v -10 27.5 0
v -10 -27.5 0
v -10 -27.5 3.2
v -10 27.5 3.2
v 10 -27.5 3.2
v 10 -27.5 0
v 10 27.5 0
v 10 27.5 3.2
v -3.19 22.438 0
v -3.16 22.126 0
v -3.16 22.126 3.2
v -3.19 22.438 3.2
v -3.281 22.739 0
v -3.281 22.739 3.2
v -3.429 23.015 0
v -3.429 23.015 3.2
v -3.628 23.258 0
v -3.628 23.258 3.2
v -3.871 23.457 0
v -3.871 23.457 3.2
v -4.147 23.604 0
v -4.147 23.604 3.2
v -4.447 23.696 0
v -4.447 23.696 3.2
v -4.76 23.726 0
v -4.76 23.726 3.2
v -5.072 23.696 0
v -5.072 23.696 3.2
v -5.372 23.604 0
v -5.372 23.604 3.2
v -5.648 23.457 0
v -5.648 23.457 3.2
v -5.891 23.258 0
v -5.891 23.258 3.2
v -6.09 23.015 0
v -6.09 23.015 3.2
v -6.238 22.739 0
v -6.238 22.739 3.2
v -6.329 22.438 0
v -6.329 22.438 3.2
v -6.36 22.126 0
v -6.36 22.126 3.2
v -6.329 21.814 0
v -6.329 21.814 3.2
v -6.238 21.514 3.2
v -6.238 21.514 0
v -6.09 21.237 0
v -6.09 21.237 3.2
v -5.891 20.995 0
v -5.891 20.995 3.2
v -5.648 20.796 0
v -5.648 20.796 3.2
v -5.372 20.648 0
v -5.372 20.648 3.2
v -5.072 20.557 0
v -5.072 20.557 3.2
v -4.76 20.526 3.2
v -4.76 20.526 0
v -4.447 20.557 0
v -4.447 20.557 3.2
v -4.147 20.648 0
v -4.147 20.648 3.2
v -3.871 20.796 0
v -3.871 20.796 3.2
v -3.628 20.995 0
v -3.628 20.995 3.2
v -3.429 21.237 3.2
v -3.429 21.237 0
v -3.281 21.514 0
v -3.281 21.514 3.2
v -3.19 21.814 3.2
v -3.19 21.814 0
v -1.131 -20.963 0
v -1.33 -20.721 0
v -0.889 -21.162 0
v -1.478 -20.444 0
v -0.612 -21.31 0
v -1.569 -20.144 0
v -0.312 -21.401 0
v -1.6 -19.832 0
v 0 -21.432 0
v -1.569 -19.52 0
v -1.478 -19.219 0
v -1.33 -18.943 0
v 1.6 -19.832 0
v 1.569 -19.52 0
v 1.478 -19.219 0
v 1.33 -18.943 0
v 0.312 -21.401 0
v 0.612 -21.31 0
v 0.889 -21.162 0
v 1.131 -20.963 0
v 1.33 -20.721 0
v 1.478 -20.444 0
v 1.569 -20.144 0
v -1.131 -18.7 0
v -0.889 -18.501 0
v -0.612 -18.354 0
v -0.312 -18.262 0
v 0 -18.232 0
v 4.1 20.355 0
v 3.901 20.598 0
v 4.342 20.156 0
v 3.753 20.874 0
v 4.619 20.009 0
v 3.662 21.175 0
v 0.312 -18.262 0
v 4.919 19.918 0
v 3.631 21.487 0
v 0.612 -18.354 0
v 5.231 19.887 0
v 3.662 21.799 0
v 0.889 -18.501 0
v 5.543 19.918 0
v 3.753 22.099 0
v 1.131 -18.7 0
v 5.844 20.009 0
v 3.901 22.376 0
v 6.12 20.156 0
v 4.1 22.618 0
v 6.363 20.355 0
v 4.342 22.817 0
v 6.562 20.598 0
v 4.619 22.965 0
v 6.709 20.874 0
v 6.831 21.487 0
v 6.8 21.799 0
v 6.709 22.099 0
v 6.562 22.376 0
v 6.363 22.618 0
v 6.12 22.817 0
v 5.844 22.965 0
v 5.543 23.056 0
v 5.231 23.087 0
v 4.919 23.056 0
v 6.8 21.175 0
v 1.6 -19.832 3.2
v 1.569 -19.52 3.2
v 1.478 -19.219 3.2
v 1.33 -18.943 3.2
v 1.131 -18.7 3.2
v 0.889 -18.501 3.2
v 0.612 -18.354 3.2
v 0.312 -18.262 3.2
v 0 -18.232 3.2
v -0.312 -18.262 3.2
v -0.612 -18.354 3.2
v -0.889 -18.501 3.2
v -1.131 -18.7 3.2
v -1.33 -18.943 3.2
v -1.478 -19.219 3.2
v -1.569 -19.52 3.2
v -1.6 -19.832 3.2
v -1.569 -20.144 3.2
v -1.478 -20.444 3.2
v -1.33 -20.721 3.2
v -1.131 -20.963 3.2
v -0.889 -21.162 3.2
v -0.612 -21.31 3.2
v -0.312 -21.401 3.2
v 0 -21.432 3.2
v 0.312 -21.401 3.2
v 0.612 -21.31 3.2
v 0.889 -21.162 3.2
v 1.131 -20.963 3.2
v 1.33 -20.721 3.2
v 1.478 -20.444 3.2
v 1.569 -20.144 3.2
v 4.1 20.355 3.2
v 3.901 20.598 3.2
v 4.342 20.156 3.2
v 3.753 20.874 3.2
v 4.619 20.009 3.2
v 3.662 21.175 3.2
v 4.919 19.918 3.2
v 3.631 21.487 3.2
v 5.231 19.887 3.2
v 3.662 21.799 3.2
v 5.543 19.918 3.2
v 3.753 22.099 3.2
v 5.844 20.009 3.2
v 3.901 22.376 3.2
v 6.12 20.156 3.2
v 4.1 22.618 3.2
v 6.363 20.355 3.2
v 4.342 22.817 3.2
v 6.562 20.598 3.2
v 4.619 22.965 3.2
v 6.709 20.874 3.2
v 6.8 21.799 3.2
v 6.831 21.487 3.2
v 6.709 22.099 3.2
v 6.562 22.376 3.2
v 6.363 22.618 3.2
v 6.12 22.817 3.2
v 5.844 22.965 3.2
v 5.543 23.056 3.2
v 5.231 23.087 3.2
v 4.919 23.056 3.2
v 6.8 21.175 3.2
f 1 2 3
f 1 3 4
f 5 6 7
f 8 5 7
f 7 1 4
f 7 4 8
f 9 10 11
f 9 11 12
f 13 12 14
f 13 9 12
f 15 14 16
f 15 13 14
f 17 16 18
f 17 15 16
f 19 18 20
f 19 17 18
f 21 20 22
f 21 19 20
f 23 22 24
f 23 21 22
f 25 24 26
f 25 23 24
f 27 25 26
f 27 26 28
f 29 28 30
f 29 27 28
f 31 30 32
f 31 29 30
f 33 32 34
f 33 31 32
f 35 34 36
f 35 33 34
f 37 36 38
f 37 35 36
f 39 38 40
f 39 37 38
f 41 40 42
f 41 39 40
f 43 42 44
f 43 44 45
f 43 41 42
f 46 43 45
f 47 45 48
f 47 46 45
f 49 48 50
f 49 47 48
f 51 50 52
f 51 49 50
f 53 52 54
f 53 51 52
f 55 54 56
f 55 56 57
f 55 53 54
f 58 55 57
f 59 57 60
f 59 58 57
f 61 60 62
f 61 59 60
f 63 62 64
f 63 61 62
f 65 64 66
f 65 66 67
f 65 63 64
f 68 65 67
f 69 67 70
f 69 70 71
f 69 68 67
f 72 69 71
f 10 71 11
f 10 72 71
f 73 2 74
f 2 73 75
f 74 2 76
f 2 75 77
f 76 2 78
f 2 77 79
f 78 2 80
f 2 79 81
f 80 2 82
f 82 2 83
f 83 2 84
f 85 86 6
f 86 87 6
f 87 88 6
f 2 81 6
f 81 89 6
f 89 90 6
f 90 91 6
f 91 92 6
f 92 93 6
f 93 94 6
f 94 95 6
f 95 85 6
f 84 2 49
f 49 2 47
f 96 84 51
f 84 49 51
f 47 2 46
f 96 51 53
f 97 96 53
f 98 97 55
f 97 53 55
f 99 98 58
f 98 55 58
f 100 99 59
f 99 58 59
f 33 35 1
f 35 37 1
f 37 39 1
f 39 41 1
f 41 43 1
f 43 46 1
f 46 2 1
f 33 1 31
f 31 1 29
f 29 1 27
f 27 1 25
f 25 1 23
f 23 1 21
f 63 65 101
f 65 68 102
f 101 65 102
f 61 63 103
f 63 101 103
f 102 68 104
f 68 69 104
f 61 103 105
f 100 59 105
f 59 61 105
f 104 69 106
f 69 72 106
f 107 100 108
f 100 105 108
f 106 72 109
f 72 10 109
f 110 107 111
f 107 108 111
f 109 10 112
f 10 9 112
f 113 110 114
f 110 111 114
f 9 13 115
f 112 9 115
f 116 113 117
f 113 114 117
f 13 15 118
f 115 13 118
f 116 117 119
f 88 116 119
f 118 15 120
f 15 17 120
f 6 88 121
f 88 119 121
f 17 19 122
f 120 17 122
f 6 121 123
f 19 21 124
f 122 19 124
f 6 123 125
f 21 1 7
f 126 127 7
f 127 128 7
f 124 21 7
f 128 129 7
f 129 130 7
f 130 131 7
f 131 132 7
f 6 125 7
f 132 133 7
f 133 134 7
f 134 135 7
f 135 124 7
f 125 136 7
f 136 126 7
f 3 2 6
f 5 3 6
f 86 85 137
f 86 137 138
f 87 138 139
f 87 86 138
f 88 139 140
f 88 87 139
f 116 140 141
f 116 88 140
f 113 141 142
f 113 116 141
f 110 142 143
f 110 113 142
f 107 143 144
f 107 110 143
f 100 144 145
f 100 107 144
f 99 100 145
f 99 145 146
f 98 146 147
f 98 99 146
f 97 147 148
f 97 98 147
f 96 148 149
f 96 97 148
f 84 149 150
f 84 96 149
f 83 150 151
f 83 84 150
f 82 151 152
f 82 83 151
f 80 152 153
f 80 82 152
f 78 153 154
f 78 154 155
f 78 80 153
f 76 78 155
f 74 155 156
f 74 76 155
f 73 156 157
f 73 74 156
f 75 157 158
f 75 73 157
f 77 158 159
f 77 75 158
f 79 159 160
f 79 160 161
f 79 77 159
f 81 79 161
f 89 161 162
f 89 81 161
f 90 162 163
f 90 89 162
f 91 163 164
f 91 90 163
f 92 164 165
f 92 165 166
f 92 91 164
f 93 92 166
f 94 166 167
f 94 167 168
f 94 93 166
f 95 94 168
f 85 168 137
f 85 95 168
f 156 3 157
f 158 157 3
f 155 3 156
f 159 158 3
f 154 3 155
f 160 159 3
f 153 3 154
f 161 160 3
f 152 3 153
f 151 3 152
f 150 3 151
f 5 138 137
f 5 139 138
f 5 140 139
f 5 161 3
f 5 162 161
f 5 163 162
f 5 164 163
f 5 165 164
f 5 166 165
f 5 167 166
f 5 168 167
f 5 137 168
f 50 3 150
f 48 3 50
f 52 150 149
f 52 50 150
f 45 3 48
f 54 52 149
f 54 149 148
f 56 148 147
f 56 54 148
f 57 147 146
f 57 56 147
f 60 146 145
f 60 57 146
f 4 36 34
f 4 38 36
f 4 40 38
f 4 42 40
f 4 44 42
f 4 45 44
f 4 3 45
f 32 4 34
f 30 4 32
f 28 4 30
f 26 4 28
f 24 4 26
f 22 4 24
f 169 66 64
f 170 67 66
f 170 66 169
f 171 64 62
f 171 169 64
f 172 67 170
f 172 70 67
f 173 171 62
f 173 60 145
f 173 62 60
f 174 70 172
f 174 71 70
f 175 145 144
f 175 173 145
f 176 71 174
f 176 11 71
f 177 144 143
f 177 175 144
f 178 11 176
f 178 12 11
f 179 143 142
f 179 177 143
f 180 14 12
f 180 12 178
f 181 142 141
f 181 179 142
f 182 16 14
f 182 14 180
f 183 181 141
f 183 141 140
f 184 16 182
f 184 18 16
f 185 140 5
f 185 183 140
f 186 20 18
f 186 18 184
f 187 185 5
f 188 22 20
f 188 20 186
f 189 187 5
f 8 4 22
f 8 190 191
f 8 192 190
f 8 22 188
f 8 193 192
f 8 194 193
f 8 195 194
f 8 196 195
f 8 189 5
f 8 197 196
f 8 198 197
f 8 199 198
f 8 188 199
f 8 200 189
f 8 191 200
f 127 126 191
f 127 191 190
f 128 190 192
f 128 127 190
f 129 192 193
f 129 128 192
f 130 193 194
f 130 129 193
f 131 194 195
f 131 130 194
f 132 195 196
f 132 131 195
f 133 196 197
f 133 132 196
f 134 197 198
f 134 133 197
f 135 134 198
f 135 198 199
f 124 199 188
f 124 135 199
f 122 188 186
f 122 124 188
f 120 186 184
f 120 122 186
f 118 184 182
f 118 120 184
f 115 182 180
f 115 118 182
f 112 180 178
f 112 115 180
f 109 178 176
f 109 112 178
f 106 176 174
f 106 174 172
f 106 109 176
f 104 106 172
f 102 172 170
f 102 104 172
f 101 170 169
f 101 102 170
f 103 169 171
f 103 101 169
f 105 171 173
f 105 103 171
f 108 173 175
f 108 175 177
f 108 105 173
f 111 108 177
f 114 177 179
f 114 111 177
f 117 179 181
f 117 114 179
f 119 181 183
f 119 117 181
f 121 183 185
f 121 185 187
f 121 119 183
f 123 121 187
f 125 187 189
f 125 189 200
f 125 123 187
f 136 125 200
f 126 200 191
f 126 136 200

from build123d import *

# Parameters (mm, degrees)
F0_W     = 20
F0_H     = 55
F0_R     = 1.6
F1_DEPTH = 3.2
F2_DEPTH = 3.2
F3_DEPTH = 3.2


with BuildPart() as f1:
    # F0 (on Top) → F1 (new body)
    with BuildSketch(Plane.XY):
        Rectangle(F0_W, F0_H)
        with Locations((0, -19.831753)):
            Circle(F0_R, mode=Mode.SUBTRACT)
        with Locations((-4.759501, 22.12626)):
            Circle(F0_R, mode=Mode.SUBTRACT)
        with Locations((5.231229, 21.486786)):
            Circle(F0_R, mode=Mode.SUBTRACT)
    extrude(amount=F1_DEPTH)

    # F0 (on Top) → F2 (join)
    with BuildSketch(Plane.XY):
        Rectangle(F0_W, F0_H)
        with Locations((0, -19.831753)):
            Circle(F0_R, mode=Mode.SUBTRACT)
        with Locations((-4.759501, 22.12626)):
            Circle(F0_R, mode=Mode.SUBTRACT)
        with Locations((5.231229, 21.486786)):
            Circle(F0_R, mode=Mode.SUBTRACT)
    extrude(amount=F2_DEPTH)

    # F0 (on Top) → F3 (join)
    with BuildSketch(Plane.XY):
        Rectangle(F0_W, F0_H)
        with Locations((0, -19.831753)):
            Circle(F0_R, mode=Mode.SUBTRACT)
        with Locations((-4.759501, 22.12626)):
            Circle(F0_R, mode=Mode.SUBTRACT)
        with Locations((5.231229, 21.486786)):
            Circle(F0_R, mode=Mode.SUBTRACT)
    extrude(amount=F3_DEPTH)


solid = f1.part
